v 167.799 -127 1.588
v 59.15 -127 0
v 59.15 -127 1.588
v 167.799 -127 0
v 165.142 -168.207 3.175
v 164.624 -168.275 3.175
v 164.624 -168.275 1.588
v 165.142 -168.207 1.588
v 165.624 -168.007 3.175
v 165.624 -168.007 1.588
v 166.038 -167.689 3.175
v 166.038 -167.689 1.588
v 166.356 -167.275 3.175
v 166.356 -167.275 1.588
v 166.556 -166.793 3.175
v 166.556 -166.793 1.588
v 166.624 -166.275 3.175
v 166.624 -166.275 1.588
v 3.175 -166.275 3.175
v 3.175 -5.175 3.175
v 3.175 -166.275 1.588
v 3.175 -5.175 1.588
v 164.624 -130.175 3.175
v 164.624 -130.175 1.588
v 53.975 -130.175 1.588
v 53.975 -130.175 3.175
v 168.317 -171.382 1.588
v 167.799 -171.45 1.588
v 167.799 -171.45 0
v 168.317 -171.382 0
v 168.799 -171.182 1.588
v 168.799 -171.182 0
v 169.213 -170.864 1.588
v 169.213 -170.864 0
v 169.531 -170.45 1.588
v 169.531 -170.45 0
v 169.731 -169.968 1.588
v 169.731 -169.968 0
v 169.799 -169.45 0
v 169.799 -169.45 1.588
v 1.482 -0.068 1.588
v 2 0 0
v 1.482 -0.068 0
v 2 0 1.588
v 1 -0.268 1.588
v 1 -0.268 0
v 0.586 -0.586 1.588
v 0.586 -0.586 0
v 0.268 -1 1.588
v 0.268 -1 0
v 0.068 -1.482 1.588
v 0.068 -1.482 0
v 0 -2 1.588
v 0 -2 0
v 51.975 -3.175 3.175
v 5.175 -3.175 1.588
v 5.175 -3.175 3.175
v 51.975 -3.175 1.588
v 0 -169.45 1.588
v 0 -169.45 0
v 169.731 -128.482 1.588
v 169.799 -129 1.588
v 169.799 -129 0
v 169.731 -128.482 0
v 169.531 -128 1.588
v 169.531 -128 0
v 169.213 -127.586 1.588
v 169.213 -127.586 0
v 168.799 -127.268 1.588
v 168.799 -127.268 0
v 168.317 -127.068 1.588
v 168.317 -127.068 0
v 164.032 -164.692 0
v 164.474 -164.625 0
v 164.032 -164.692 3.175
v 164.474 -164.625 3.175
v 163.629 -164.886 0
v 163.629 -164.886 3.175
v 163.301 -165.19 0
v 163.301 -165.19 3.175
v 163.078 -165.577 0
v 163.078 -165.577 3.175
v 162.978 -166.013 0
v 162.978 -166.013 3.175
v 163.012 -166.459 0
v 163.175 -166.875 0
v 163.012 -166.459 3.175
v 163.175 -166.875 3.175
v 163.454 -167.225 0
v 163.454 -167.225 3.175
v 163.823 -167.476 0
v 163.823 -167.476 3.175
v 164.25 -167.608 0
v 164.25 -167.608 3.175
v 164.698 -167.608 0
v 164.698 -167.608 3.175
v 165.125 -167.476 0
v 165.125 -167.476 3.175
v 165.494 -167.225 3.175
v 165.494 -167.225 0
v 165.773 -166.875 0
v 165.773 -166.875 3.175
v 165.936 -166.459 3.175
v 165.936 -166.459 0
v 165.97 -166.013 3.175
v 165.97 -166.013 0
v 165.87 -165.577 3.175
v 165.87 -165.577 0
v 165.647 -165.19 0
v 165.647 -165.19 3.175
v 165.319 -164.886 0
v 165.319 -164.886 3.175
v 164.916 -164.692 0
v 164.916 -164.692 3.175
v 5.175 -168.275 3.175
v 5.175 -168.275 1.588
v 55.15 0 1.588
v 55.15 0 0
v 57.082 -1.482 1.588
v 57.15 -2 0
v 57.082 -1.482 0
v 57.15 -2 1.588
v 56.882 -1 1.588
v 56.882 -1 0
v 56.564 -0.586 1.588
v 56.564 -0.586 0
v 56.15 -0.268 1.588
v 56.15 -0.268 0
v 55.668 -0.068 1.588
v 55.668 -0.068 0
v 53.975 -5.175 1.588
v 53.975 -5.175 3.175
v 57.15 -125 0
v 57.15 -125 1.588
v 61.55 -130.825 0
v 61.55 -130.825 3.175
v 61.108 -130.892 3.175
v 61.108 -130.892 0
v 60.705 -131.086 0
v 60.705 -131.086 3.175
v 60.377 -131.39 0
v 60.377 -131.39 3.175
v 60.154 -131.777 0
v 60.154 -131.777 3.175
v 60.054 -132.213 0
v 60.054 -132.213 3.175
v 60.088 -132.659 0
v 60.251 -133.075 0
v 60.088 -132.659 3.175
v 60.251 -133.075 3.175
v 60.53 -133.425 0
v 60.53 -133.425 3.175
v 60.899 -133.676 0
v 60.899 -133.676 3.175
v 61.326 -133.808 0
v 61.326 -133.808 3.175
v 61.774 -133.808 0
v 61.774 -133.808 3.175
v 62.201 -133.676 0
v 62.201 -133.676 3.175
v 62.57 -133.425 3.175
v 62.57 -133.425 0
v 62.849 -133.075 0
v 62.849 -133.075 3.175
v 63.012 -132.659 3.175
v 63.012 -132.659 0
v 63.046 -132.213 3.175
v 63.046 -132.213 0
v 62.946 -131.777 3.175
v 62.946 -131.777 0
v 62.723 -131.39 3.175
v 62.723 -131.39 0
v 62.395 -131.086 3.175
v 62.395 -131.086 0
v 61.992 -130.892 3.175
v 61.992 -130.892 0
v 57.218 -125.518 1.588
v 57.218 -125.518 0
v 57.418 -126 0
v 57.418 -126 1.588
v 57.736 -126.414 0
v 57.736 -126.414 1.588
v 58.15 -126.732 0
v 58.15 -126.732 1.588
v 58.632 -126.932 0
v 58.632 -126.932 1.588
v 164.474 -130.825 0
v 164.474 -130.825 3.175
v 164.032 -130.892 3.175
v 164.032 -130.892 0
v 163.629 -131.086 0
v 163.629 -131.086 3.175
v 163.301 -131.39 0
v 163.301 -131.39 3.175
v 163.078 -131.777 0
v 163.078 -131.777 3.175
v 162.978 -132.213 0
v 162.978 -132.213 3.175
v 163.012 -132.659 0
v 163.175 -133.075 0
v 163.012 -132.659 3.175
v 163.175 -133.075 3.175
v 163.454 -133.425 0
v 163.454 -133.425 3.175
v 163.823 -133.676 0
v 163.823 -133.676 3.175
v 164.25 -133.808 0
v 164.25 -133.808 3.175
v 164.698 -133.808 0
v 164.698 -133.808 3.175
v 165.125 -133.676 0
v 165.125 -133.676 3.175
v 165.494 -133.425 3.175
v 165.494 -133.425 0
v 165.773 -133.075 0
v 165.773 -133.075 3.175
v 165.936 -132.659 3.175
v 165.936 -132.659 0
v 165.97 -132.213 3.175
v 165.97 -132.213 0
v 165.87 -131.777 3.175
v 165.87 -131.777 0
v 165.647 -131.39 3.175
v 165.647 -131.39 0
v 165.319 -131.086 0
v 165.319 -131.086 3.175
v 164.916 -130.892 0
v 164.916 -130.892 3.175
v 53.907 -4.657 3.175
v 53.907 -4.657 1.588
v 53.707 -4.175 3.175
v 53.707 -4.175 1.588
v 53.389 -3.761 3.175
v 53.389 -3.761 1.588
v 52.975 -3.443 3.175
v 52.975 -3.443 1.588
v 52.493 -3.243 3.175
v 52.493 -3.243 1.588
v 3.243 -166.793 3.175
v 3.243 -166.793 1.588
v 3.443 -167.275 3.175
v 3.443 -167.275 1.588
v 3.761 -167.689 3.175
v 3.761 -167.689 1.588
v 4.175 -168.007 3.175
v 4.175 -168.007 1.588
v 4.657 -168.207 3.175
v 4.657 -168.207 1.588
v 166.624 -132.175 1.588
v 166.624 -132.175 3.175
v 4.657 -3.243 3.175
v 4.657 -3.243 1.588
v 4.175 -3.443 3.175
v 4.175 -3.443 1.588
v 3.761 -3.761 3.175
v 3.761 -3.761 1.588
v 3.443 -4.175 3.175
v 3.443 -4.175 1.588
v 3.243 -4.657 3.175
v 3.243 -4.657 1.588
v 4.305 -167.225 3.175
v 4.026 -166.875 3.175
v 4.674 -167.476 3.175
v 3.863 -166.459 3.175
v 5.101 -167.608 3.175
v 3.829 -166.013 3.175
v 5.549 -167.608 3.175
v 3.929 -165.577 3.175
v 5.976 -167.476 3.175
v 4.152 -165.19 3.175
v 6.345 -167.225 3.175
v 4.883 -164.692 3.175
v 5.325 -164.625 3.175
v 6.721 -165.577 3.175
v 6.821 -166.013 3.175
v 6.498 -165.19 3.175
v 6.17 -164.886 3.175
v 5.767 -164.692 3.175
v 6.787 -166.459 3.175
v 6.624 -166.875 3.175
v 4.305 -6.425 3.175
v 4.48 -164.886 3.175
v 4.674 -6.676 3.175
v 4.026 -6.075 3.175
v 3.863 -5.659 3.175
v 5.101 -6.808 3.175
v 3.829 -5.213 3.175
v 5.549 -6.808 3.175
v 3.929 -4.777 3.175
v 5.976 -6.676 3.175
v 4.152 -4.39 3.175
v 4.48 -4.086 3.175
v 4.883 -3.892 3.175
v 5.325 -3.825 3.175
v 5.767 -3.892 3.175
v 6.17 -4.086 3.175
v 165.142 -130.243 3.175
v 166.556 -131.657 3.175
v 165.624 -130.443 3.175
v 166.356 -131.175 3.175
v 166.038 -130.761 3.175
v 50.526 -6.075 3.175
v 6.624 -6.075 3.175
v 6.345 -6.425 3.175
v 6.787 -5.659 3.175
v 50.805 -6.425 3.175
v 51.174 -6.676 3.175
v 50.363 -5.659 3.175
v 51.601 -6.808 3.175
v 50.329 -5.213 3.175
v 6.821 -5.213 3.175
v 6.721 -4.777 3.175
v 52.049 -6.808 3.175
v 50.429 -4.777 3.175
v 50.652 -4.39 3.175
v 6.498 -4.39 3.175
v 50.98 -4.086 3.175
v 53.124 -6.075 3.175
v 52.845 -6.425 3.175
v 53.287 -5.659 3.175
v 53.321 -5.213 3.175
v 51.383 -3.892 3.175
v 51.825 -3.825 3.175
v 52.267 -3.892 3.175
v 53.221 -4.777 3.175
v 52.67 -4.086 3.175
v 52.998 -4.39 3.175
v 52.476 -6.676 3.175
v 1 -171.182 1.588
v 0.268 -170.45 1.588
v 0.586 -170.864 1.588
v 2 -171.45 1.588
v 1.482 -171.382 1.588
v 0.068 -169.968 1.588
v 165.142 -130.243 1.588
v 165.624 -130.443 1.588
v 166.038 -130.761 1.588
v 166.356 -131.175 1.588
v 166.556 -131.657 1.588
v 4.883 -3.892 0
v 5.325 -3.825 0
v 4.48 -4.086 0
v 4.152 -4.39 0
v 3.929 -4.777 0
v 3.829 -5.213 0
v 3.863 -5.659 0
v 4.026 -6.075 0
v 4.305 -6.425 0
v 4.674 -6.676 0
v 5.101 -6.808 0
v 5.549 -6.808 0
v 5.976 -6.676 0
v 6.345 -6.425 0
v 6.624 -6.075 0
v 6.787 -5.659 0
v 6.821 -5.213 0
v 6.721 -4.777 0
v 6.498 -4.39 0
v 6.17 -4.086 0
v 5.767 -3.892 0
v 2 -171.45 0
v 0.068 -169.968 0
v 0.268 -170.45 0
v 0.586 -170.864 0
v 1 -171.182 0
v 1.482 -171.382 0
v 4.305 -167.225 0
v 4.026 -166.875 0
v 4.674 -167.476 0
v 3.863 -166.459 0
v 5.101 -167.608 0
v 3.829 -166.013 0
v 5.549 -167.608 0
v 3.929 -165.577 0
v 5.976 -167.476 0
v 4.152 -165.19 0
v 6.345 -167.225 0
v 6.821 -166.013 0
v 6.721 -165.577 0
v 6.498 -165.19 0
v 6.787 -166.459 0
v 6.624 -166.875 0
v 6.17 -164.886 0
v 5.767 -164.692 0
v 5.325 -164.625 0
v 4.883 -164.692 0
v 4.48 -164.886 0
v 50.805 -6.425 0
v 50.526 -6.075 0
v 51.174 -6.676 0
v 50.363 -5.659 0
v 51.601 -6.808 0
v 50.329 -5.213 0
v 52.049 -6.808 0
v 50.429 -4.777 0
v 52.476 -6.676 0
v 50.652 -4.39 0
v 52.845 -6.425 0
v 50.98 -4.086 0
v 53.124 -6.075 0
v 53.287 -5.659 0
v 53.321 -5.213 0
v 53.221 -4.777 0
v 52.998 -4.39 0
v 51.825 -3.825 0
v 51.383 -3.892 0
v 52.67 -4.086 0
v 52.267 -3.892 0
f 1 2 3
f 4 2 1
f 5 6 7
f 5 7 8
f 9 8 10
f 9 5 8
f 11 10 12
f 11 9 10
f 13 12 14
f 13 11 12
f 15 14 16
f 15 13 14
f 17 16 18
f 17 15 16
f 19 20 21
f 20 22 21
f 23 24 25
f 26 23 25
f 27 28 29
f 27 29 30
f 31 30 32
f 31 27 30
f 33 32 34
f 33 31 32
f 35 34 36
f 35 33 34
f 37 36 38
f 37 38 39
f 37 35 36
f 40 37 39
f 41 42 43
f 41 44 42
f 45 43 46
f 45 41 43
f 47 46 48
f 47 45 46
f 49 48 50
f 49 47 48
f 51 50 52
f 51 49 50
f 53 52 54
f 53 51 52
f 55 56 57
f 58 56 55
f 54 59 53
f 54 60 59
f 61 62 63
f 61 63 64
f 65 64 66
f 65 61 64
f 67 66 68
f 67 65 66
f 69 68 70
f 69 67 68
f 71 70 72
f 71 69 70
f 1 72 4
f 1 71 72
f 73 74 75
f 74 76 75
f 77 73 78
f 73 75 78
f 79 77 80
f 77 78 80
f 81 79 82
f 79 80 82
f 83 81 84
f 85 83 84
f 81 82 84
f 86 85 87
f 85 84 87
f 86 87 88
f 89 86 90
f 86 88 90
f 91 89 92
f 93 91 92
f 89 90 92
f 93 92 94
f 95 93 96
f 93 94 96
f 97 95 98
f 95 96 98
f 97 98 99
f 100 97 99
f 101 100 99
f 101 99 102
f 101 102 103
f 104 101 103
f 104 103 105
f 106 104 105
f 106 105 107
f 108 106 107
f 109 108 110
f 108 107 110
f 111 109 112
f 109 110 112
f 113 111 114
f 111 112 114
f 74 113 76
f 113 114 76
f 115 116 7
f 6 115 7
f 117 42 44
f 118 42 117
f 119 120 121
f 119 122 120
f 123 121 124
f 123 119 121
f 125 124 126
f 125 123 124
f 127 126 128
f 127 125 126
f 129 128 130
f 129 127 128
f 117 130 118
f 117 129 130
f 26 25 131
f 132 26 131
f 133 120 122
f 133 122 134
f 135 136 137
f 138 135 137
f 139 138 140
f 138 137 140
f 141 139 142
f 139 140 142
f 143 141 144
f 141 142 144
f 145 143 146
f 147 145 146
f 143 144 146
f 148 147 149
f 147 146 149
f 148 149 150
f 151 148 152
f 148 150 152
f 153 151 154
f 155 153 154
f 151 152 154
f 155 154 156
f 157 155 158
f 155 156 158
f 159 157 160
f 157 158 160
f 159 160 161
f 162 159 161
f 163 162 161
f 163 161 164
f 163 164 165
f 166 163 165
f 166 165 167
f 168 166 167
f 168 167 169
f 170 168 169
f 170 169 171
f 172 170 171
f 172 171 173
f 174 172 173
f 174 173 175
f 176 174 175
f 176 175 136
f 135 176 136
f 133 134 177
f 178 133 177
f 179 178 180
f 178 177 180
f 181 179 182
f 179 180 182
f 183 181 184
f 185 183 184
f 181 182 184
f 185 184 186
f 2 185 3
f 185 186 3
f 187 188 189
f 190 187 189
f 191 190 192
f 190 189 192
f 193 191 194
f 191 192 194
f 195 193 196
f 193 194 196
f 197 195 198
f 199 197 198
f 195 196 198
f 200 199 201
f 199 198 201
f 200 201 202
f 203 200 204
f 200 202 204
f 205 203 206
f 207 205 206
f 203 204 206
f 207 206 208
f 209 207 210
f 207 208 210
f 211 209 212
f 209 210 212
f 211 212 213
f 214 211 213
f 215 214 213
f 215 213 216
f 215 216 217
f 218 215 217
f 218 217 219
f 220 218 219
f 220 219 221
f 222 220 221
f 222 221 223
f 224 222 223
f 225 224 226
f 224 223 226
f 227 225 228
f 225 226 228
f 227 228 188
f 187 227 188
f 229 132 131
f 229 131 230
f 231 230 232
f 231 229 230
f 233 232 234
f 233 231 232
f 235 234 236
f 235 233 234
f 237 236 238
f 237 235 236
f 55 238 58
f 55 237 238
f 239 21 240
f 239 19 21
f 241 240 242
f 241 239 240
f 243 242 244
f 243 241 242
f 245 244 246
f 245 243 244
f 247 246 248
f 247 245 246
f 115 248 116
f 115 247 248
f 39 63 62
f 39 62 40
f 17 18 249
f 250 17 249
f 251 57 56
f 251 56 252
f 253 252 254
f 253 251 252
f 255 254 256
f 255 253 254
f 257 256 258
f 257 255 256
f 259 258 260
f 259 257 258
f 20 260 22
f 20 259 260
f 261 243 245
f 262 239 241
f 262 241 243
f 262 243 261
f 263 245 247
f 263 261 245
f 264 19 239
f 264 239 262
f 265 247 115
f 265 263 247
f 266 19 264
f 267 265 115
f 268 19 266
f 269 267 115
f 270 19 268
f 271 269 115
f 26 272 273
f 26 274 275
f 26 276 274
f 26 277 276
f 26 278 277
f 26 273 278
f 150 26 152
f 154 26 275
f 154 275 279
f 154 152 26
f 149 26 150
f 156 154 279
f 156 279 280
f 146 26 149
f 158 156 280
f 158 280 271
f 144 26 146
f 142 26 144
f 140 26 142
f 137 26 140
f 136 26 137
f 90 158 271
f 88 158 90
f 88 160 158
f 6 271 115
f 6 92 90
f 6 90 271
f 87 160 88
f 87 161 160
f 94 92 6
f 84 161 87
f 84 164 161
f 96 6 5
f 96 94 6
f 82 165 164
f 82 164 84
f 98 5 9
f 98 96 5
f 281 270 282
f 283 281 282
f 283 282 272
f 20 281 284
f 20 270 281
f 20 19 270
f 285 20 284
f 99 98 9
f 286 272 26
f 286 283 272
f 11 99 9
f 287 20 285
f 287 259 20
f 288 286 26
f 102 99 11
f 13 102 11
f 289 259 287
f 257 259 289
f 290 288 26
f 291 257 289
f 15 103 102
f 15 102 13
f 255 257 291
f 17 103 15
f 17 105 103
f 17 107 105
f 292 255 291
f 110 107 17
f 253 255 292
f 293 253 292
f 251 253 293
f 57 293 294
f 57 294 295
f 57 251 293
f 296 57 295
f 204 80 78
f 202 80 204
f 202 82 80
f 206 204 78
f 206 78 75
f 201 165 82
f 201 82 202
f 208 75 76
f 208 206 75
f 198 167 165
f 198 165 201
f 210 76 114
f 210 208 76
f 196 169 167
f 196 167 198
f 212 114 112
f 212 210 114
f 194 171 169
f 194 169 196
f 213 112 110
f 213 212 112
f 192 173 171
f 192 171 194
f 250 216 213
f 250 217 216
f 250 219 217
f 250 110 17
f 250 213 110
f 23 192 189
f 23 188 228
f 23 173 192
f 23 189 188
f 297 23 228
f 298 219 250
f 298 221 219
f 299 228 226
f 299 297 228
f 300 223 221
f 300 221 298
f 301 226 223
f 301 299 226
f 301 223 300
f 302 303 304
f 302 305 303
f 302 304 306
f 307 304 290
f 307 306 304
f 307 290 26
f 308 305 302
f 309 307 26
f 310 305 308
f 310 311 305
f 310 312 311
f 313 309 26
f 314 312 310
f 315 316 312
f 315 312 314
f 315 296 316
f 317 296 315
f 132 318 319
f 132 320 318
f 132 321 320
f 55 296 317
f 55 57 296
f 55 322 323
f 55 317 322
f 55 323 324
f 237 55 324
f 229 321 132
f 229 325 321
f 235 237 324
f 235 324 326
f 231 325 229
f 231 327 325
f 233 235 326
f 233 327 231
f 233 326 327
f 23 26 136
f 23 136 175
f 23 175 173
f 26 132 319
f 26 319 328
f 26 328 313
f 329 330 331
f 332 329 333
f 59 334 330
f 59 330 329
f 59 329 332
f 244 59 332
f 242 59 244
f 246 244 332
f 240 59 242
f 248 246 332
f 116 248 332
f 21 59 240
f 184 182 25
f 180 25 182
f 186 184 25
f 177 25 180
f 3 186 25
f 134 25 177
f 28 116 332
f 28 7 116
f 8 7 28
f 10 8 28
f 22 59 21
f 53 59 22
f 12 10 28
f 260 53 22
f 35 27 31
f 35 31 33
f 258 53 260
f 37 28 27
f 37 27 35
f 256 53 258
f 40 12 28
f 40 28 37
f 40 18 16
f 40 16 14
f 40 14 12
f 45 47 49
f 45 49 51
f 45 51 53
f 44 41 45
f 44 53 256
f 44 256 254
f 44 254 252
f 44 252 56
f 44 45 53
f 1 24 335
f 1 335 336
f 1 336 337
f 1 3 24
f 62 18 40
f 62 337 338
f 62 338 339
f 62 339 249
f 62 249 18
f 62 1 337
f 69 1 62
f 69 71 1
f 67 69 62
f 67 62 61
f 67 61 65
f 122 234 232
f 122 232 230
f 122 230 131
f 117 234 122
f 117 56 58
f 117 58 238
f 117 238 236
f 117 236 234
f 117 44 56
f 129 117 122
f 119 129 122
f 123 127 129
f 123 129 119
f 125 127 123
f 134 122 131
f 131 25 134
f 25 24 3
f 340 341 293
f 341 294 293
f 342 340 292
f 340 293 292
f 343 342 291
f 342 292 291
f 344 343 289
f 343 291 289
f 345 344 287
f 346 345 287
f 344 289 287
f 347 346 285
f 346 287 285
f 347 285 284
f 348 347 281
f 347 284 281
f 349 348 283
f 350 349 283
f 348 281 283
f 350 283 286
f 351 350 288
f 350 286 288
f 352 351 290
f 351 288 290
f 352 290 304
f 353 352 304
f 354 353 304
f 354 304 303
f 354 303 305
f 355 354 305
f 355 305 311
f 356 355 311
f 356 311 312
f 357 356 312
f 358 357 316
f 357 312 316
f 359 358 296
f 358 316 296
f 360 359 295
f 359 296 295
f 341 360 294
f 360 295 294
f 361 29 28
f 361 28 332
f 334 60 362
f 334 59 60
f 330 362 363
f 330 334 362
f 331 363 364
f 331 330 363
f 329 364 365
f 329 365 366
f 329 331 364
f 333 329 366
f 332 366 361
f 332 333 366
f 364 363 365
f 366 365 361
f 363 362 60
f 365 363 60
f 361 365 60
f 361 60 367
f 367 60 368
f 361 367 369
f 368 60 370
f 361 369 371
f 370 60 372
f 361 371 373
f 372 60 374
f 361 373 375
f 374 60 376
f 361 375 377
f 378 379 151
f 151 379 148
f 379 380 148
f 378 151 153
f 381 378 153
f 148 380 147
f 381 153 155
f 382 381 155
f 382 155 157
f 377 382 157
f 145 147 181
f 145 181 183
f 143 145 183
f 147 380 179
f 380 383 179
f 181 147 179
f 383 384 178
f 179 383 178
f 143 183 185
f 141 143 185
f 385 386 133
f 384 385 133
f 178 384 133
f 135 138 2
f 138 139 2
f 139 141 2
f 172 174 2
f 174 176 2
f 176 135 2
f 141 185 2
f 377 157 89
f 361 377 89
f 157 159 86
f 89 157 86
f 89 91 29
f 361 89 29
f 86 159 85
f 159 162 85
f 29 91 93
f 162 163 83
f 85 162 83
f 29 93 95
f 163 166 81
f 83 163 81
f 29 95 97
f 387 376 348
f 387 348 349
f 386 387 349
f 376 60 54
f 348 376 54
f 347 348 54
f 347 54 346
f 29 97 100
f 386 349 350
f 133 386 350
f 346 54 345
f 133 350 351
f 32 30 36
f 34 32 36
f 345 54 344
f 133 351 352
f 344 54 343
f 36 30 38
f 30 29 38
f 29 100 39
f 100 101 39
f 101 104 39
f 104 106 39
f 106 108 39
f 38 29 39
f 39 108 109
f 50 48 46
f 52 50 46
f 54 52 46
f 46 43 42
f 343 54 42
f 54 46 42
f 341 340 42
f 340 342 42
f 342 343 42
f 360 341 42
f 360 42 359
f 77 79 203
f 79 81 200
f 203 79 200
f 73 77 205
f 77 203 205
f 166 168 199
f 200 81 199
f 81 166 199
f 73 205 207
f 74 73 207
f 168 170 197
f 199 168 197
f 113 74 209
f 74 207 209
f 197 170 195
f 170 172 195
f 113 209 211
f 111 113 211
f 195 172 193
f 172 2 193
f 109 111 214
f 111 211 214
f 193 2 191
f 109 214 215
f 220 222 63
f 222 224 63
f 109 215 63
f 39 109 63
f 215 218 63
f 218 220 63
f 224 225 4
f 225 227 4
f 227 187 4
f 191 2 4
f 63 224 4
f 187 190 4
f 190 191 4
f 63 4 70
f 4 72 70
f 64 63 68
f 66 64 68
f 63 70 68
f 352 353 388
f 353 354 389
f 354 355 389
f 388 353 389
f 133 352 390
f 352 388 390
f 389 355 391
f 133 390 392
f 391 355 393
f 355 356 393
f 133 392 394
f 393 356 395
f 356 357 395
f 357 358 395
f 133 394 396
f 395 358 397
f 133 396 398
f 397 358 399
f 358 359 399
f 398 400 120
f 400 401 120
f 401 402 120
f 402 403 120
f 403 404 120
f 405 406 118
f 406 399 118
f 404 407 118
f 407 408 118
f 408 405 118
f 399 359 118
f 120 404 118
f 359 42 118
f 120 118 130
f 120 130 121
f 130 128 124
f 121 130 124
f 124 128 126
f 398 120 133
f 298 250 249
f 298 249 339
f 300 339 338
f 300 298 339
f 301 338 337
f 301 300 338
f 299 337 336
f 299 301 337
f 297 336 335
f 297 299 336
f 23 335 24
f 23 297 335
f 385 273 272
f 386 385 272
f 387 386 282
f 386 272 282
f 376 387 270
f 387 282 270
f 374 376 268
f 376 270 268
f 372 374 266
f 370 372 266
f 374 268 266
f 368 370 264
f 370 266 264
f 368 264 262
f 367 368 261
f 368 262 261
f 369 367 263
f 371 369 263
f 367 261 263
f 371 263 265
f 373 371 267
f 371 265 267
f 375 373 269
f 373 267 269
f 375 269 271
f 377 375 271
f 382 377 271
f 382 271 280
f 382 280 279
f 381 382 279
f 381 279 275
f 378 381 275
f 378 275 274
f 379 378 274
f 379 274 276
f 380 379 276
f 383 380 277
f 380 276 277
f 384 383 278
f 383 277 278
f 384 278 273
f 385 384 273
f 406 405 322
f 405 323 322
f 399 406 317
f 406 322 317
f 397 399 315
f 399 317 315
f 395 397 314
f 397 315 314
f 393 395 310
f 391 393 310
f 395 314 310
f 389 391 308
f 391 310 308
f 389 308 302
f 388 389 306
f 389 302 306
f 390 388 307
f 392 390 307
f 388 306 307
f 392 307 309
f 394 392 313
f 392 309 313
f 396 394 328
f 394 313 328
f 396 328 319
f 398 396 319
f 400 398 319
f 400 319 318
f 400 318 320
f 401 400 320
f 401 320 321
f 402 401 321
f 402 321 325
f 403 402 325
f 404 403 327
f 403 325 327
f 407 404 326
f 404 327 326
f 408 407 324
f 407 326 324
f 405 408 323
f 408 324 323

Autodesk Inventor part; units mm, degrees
ref_plane "YZ Plane" through (0, 0, 0) normal (1, 0, 0) x (0, 1, 0)
ref_plane "XZ Plane" through (0, 0, 0) normal (0, 1, 0) x (-1, 0, 0)
ref_plane "XY Plane" through (0, 0, 0) normal (0, 0, 1) x (1, 0, 0)
sketch "Sketch1" plane through (0, 0, 0) normal (0, 0, 1) x (1, 0, 0)
  line L0 (0, 0) -> (3.175, 0)
  line L1 (3.175, 0) -> (53.975, 0)
  line L2 (53.975, 0) -> (57.15, 0)
  line L3 (57.15, 0) -> (57.15, -127)
  line L4 (57.15, -127) -> (111.887, -127)
  line L5 (111.887, -127) -> (169.799, -127)
  line L6 (169.799, -127) -> (169.799, -130.175)
  line L7 (169.799, -130.175) -> (169.799, -168.275)
  line L8 (169.799, -168.275) -> (169.799, -171.45)
  line L9 (169.799, -171.45) -> (57.15, -171.45)
  line L10 (57.15, -171.45) -> (0, -171.45)
  line L11 (0, -171.45) -> (0, 0)
  dimension "d0" = 3.175
  dimension "d1" = 50.8
  dimension "d2" = 3.175
  dimension "d3" = 127
  dimension "d4" = 54.737
  dimension "d5" = 57.912
  dimension "d6" = 3.175
  dimension "d7" = 38.1
  dimension "d8" = 3.175
extrude "Extrusion1" add sketch "Sketch1" along normal blind 1.5875
sketch "Sketch2" plane through (0, 0, 1.5875) normal (0, 0, 1) x (1, 0, 0)
  line L0 (57.15, 0) -> (0, 0) projected
  line L1 (0, 0) -> (0, -171.45) projected
  line L2 (0, -171.45) -> (169.799, -171.45) projected
  line L3 (169.799, -171.45) -> (169.799, -127) projected
  line L4 (169.799, -127) -> (57.15, -127) projected
  line L5 (3.175, -3.175) -> (3.175, -168.275)
  line L6 (3.175, -168.275) -> (166.624, -168.275)
  line L7 (166.624, -168.275) -> (166.624, -130.175)
  line L8 (166.624, -130.175) -> (53.975, -130.175)
  line L9 (53.975, -130.175) -> (53.975, -3.175)
  line L10 (3.175, -3.175) -> (53.975, -3.175)
extrude "Extrusion2" add sketch "Sketch2" along normal blind 1.5875
sketch "Sketch3" plane through (0, 0, 0) normal (0, 0, -1) x (-1, 0, 0)
  line L0 (-169.799, -127) -> (-57.15, -127) projected
  line L1 (-57.15, -127) -> (-57.15, -130.175)
  line L2 (-53.975, -130.175) -> (-166.624, -130.175) projected
  line L3 (-57.15, -130.175) -> (-61.55, -130.175)
  line L4 (-61.55, -130.175) -> (-61.55, -132.325)
  line L5 (-166.624, -168.275) -> (-166.624, -130.175) projected
  line L6 (-166.624, -130.175) -> (-164.474, -130.175)
  line L7 (-164.474, -130.175) -> (-164.474, -132.325)
  line L8 (-166.624, -168.275) -> (-3.175, -168.275) projected
  line L9 (-166.624, -168.275) -> (-164.474, -168.275)
  line L10 (-164.474, -168.275) -> (-164.474, -166.125)
  line L11 (-3.175, -168.275) -> (-3.175, -3.175) projected
  line L12 (-3.175, -168.275) -> (-5.325, -168.275)
  line L13 (-5.325, -168.275) -> (-5.325, -166.125)
  line L14 (-3.175, -3.175) -> (-5.325, -3.175)
  line L15 (-3.175, -3.175) -> (-53.975, -3.175) projected
  line L16 (-5.325, -3.175) -> (-5.325, -5.325)
  line L17 (-53.975, -3.175) -> (-51.825, -3.175)
  line L18 (-51.825, -3.175) -> (-51.825, -5.325)
  point P0 (0, 0)
  dimension "d23" = 4.4
  dimension "d24" = 2.15
  dimension "d25" = 270
  dimension "d26" = 2.15
  dimension "d27" = 2.15
  dimension "d28" = 2.15
  dimension "d29" = 2.15
  dimension "d30" = 2.15
  dimension "d31" = 2.15
  dimension "d32" = 2.15
  dimension "d33" = 2.15
  dimension "d34" = 2.15
hole "Hole1" at (51.825, -5.325, 0) at (5.325, -5.325, 0) at (61.55, -132.325, 0) at (5.325, -166.125, 0) at (164.474, -166.125, 0) at (164.474, -132.325, 0) direction (0, 0, 1) diameter 3 depth 3.175
fillet "Fillet1" radius 2 11 edges at (169.799, -127, 0.7937) (166.624, -130.175, 2.3812) (166.624, -168.275, 2.3812) (169.799, -171.45, 0.7937) (57.15, -127, 0.7937) (3.175, -168.275, 2.3812) (0, -171.45, 0.7937) (57.15, 0, 0.7937) (53.975, -3.175, 2.3812) (3.175, -3.175, 2.3812) (0, 0, 0.7937)
properties part number "Main Body Lid Backwards"
